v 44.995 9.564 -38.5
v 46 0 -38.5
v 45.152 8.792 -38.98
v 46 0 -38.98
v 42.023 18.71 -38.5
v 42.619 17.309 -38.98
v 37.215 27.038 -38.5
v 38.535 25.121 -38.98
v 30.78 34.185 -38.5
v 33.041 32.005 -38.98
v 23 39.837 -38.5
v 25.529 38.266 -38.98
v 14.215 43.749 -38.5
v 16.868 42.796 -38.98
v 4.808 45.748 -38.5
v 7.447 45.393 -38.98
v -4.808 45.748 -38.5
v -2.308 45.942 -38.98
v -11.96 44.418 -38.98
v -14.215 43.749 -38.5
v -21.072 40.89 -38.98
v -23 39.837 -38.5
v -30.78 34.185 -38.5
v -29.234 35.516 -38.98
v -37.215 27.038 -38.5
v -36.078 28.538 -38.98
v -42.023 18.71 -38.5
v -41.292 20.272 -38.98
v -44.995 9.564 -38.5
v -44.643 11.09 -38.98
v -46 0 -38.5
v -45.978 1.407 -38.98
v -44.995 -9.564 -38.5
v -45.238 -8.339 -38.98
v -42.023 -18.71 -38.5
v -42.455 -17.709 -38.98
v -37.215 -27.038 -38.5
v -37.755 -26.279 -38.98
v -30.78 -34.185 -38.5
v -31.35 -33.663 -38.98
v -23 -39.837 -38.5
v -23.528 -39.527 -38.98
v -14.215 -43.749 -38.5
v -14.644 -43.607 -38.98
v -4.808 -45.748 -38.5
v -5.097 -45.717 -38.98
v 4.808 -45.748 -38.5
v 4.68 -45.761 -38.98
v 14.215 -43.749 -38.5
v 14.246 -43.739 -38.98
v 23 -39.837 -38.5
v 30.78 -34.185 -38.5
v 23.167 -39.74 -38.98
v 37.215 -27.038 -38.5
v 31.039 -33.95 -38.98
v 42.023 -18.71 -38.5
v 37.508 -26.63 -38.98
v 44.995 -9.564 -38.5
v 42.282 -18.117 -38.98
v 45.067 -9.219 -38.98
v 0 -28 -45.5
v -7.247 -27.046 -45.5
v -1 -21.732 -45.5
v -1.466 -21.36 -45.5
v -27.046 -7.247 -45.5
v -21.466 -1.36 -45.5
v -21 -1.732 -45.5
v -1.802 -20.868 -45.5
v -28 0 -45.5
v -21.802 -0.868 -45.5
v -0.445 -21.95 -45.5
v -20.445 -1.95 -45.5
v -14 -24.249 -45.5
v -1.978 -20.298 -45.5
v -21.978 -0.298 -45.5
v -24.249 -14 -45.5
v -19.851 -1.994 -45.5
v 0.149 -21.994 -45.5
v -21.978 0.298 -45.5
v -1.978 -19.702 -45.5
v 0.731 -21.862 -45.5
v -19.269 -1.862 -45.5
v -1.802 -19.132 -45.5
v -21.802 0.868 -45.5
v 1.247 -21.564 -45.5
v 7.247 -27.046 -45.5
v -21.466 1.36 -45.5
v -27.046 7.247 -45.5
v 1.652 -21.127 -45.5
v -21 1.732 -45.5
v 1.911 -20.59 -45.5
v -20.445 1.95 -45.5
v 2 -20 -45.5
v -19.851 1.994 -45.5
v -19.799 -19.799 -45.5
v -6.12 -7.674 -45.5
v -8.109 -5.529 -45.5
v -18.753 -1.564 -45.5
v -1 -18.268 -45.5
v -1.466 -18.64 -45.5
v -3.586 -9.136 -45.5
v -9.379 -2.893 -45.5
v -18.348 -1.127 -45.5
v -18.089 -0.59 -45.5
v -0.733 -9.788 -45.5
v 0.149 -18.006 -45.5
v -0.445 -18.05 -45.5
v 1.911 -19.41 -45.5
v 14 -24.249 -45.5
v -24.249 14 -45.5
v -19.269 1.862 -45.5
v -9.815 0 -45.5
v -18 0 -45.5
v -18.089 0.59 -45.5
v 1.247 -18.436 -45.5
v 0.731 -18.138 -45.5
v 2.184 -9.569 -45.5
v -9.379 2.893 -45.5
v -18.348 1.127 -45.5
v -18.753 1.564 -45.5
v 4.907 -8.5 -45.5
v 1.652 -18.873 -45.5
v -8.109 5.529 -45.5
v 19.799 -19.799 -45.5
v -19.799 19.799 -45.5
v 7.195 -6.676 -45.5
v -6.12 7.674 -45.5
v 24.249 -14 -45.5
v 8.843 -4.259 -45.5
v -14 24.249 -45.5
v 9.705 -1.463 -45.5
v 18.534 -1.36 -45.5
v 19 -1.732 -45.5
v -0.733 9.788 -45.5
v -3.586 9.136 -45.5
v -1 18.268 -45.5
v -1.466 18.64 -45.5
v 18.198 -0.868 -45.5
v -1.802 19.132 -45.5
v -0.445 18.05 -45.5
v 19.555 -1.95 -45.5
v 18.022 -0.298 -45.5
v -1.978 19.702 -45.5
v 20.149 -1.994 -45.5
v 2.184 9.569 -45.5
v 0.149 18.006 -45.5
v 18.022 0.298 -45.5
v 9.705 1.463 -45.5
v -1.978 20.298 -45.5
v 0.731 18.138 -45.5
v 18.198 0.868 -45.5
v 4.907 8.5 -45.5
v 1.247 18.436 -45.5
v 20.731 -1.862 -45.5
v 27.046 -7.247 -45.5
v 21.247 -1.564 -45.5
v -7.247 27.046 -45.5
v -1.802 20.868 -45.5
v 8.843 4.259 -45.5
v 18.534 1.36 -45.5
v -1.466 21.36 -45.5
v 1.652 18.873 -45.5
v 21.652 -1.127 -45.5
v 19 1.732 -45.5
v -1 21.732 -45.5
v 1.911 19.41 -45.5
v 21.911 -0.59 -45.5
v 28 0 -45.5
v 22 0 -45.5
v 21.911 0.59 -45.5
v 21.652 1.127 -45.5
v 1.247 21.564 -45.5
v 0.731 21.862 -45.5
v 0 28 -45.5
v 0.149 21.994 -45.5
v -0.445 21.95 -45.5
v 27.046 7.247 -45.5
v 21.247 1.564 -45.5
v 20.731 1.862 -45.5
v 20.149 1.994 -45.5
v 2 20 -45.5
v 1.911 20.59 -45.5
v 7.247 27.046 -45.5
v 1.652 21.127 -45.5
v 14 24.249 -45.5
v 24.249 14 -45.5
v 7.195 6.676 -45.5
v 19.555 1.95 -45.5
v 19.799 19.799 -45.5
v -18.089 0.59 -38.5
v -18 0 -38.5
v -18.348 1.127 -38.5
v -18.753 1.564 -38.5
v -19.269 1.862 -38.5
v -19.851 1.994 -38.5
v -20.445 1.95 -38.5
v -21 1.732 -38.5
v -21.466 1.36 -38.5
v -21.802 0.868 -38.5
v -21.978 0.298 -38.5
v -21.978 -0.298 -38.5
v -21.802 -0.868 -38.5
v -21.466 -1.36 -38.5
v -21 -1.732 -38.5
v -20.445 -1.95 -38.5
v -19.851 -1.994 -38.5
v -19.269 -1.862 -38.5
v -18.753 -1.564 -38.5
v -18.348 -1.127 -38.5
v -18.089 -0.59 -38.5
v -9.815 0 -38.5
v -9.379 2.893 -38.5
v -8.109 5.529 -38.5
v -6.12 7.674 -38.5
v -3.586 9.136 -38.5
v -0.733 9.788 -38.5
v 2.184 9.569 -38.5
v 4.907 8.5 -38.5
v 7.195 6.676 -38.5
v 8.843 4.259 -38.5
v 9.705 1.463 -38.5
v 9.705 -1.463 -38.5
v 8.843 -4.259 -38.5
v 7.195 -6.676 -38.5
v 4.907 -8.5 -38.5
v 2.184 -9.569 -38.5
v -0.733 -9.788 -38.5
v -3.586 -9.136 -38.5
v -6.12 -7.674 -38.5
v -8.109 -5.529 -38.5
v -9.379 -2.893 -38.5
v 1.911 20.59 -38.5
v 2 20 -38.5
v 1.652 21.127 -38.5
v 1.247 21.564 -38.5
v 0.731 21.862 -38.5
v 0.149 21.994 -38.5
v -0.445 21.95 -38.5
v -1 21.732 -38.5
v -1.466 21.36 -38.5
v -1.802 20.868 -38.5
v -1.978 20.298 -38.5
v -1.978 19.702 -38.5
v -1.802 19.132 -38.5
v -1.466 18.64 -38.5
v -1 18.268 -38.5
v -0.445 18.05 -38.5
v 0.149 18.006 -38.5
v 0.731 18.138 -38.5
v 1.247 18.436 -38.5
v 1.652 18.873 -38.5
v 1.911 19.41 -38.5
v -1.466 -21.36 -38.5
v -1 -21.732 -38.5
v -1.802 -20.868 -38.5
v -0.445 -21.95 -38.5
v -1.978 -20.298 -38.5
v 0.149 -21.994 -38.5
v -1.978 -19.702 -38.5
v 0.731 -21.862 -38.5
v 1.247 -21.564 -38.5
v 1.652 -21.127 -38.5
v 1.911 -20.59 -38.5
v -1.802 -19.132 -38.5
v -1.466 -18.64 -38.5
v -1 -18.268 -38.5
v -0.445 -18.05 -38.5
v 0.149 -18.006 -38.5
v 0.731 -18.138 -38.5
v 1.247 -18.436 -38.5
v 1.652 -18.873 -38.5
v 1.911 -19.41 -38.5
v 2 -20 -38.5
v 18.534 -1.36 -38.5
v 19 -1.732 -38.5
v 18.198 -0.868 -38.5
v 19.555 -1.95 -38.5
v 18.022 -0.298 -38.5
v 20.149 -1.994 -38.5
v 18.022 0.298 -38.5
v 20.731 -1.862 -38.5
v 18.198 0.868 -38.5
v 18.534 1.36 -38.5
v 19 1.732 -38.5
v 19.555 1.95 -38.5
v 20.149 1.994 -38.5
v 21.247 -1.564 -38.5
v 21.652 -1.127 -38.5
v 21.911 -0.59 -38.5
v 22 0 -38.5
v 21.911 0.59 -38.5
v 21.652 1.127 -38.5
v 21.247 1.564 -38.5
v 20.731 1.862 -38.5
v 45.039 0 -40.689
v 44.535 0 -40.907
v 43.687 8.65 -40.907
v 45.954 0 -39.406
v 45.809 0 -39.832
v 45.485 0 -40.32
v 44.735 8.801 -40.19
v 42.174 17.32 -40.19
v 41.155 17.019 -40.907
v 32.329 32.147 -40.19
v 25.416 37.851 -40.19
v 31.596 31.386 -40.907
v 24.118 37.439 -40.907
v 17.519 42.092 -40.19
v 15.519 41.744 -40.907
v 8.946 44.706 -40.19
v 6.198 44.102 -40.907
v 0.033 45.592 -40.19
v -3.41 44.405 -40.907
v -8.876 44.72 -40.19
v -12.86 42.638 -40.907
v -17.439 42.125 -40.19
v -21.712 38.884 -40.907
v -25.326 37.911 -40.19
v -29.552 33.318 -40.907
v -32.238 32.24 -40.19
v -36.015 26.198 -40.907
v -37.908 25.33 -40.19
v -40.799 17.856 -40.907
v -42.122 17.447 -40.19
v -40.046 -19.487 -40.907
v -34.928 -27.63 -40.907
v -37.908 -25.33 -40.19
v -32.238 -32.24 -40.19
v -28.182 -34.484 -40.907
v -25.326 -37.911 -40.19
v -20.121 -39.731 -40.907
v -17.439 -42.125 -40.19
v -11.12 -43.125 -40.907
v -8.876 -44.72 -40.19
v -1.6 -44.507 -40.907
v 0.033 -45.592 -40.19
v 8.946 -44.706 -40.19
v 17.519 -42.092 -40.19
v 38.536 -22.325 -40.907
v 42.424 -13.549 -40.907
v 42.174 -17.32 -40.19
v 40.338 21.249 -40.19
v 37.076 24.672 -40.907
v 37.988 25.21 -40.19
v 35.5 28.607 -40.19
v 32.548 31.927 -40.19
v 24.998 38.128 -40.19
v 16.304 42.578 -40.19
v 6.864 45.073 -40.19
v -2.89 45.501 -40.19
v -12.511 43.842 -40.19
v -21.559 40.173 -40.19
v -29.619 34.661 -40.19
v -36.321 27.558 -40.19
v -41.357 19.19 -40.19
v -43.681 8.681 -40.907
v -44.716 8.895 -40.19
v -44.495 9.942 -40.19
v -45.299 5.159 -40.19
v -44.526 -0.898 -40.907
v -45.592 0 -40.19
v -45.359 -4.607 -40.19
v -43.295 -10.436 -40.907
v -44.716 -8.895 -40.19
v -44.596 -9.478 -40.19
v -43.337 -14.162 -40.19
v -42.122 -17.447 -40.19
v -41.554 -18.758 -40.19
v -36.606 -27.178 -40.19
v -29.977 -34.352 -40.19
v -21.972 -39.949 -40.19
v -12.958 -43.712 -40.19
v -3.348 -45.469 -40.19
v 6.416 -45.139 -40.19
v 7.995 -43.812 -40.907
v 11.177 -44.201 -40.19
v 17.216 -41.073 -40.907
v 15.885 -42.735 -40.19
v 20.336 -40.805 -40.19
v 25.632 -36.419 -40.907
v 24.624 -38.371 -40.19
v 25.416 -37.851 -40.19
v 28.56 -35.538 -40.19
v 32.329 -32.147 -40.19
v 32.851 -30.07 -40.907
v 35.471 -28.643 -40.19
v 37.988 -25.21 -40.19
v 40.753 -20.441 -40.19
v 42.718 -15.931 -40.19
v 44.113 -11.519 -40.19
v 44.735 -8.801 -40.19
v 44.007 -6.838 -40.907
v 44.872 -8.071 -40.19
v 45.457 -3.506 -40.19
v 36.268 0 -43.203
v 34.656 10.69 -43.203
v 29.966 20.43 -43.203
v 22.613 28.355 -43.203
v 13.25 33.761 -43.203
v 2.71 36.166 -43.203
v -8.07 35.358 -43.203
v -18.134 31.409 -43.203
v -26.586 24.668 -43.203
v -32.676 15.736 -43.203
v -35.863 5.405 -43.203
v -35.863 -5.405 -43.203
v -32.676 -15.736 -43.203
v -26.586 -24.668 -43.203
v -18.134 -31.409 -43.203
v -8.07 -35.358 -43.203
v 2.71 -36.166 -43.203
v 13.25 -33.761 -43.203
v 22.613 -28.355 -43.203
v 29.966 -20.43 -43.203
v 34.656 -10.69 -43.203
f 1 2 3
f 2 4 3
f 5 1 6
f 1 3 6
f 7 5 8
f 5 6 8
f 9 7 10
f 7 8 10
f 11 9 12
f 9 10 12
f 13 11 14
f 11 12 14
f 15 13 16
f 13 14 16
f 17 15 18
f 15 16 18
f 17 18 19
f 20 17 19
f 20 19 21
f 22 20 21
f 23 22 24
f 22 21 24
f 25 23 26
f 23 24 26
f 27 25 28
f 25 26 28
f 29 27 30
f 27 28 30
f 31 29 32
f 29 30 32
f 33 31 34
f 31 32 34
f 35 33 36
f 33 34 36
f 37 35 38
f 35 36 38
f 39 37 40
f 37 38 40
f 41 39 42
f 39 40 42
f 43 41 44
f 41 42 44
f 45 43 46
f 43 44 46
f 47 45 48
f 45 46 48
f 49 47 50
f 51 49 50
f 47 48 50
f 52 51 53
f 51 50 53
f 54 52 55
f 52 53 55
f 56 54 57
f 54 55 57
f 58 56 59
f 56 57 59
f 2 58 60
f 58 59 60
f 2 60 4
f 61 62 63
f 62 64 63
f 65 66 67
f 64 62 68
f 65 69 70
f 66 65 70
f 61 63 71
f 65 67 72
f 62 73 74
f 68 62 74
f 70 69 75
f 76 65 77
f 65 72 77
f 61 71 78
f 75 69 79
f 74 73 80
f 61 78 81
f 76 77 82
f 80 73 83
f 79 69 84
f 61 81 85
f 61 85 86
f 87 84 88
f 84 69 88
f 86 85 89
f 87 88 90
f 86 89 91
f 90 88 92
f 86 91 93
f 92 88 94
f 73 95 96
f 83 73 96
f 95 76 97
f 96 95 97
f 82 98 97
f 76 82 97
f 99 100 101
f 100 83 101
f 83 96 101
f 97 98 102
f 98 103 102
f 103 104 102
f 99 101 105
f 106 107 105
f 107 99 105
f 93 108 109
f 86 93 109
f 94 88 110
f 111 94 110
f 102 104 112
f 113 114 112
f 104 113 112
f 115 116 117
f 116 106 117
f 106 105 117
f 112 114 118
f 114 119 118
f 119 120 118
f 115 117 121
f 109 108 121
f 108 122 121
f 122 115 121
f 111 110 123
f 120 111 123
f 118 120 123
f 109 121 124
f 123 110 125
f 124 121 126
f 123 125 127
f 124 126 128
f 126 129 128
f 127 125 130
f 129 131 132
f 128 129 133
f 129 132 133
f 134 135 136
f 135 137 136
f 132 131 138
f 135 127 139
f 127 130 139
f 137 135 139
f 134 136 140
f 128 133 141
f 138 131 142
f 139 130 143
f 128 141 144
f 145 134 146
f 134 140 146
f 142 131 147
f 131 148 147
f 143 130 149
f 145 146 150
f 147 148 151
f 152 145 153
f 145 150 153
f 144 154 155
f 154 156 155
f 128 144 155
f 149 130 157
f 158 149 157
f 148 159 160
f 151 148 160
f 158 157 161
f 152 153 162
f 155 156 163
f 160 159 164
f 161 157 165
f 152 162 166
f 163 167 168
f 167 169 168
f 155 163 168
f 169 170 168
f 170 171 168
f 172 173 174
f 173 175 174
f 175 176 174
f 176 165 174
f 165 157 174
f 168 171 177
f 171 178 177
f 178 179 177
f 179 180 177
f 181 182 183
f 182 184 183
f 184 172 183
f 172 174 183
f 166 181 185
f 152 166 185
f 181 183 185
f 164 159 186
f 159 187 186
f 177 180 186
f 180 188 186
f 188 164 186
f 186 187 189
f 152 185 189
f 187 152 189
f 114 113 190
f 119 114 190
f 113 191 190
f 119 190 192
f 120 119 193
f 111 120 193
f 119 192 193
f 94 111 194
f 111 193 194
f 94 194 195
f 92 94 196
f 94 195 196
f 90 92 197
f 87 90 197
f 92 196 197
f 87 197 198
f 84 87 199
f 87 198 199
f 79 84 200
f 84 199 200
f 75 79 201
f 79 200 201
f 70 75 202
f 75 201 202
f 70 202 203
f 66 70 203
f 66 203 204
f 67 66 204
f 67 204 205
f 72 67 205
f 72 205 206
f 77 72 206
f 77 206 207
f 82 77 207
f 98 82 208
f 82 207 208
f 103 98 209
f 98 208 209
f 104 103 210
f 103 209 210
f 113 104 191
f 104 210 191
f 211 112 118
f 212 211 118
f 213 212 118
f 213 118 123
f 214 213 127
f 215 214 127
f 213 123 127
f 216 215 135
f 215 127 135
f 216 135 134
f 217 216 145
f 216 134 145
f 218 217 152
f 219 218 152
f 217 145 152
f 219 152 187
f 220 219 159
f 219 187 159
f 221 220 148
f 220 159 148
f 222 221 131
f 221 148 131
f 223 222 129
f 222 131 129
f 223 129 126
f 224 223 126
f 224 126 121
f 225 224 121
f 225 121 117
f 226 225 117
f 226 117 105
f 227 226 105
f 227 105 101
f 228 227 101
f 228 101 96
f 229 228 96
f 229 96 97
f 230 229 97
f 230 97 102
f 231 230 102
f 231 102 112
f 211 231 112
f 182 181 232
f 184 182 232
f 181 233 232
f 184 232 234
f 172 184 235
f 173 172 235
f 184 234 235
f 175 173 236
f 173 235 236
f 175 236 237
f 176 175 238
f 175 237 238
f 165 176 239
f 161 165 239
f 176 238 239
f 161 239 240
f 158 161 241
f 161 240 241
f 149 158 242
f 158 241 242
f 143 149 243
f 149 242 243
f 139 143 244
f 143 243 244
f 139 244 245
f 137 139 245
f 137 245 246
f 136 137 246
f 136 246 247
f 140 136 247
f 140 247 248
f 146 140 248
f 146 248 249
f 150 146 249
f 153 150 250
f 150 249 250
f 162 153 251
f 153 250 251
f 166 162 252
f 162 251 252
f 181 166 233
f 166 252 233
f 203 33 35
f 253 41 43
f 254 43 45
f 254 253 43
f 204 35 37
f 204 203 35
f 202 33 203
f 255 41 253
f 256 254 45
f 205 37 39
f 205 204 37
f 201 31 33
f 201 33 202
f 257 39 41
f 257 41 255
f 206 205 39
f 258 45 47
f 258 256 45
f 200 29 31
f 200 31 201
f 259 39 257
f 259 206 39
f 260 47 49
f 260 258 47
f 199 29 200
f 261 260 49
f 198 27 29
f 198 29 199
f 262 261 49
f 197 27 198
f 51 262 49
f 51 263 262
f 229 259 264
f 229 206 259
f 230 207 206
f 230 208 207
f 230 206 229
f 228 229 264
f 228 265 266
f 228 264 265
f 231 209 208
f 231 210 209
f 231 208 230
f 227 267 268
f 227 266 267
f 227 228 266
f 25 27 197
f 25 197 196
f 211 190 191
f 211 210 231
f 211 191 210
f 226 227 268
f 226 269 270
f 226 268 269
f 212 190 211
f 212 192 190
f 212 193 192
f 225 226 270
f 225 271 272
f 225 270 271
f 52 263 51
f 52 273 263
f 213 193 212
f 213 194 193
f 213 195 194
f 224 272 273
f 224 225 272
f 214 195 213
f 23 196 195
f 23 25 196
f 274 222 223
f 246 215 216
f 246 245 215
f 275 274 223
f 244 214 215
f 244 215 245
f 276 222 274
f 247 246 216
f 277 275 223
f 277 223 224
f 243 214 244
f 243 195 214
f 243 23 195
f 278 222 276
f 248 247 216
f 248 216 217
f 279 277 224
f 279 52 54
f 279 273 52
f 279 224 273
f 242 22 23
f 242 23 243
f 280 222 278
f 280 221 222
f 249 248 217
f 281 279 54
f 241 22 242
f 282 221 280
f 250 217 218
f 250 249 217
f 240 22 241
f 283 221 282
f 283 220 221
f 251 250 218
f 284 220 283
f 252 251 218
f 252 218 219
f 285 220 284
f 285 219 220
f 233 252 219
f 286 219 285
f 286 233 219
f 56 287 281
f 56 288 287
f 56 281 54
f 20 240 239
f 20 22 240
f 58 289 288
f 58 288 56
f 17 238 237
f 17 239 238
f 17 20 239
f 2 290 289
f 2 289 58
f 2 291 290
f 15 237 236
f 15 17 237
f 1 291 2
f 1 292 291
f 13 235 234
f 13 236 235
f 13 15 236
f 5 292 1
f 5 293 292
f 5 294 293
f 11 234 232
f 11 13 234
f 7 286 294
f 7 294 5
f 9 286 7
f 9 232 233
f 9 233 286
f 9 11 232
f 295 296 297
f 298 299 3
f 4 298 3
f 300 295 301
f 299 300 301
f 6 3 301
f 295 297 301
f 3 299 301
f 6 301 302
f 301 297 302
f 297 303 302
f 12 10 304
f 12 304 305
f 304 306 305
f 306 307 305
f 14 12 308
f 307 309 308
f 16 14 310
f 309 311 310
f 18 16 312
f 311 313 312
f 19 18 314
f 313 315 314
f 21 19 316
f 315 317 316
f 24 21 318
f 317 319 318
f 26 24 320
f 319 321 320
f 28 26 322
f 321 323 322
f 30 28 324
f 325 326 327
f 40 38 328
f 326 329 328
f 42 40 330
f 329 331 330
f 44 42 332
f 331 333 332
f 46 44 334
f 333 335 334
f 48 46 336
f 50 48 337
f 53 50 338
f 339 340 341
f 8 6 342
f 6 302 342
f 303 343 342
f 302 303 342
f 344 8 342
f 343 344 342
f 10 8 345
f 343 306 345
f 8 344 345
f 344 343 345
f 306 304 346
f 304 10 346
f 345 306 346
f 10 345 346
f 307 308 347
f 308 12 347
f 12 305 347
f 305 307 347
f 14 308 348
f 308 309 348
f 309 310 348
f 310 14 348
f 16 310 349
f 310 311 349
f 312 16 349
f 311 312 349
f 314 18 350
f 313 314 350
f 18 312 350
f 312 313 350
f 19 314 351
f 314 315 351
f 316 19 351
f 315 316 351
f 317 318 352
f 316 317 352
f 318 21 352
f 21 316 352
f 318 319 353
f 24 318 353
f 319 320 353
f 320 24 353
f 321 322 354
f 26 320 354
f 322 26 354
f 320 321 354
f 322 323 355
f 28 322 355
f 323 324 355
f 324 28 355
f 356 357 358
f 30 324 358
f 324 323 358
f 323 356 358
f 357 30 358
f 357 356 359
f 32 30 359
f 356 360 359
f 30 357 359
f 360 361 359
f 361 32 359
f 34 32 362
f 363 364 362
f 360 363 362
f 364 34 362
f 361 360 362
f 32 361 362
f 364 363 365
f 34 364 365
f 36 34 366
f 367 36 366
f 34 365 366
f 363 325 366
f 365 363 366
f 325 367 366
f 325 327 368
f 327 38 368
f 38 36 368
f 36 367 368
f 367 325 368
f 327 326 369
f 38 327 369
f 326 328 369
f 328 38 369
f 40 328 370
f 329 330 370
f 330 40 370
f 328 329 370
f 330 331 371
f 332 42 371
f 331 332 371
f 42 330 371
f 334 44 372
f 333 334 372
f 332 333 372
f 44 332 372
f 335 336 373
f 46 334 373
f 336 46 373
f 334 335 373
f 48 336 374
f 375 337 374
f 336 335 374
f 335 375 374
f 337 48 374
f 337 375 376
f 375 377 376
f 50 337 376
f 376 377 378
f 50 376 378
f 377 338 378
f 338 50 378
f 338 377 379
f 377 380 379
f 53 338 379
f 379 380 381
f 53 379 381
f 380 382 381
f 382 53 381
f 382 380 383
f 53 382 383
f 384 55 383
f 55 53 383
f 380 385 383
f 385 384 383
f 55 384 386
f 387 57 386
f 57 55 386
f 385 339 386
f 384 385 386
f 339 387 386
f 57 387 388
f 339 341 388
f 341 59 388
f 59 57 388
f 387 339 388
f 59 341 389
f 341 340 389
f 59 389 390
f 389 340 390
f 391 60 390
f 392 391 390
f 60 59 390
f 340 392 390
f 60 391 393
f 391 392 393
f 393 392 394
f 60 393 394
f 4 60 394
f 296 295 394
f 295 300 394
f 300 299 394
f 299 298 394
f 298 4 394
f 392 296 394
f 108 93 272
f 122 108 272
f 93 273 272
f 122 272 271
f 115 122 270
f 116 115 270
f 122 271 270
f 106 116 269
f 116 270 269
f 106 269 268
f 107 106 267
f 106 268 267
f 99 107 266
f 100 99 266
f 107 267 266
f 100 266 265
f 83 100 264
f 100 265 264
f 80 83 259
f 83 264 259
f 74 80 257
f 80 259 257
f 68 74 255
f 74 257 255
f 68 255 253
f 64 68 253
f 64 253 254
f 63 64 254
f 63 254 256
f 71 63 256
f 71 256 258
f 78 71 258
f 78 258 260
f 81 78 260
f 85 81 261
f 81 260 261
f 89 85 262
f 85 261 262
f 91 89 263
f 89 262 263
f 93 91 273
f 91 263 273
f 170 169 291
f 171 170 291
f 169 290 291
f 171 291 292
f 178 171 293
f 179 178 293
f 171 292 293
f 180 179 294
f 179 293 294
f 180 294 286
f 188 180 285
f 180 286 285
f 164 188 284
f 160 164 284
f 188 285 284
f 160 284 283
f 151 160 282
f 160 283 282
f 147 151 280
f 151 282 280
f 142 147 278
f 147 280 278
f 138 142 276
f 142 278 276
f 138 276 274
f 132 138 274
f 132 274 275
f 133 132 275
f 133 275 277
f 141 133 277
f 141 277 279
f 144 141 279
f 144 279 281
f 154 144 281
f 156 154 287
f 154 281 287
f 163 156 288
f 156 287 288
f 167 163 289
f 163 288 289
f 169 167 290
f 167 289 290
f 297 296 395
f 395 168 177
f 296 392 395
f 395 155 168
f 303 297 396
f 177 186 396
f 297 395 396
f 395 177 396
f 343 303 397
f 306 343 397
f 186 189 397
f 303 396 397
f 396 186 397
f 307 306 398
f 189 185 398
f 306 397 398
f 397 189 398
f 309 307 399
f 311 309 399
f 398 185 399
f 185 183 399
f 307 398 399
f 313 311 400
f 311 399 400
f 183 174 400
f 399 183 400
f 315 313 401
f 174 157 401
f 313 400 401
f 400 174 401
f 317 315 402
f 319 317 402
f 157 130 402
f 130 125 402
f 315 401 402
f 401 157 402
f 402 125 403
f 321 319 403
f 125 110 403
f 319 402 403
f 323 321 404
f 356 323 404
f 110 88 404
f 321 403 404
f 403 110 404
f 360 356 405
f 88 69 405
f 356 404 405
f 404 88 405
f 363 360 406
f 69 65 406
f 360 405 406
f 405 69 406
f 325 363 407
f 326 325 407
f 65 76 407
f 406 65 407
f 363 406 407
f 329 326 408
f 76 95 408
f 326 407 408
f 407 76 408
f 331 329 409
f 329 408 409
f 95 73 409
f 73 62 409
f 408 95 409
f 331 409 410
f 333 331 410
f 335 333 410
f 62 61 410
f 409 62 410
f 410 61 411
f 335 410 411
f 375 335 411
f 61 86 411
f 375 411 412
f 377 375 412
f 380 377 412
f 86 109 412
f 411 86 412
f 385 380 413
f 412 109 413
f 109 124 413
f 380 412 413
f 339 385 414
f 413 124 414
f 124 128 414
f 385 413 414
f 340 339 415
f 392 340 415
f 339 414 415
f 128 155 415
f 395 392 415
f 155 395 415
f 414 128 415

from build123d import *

# Parameters (mm, degrees)
BOSS_EXTRUDE1_DEPTH          = 4
SKETCH3_R                    = 1.5
BOSS_EXTRUDE2_DEPTH          = 6
F_3_0_3_DIAMETER_HOLE1_D     = 3
F_3_0_3_DIAMETER_HOLE1_DEPTH = 10
F_4_0_4_DIAMETER_HOLE1_D     = 4
F_4_0_4_DIAMETER_HOLE1_DEPTH = 10
FILLET1_R                    = 2
FILLET2_R                    = 14.5
CUT_EXTRUDE1_DEPTH           = 73.945185819
CUT_EXTRUDE1_DEPTH_BACK      = 22
SKETCH8_R                    = 46
SKETCH9_R                    = 9.814954576
CUT_EXTRUDE2_DEPTH           = 21


with BuildPart() as part:
    # Sketch1 → Revolve1 (revolve)
    with BuildSketch(Plane(origin=(0, 0, 0), x_dir=(1, 0, 0), z_dir=(0, 1, 0))):
        Polygon((28, 45.5), (0, 45.5), (0, 16.5), (36, 16.5), (46, 26.5), (46, 40.5), align=None)
    revolve(axis=Axis((0, 0, -45.5), (0, 0, 1)))

    # Sketch2 → Boss-Extrude1 (add)
    with BuildSketch(Plane(origin=(0, 0, -45.5), x_dir=(-1, 0, 0), z_dir=(0, 0, -1))):
        Polygon((-9.814954576, 0), (-4.907477288, 8.5), (4.907477288, 8.5), (9.814954576, 0), (4.907477288, -8.5), (-4.907477288, -8.5), align=None)
    extrude(amount=BOSS_EXTRUDE1_DEPTH)

    # Sketch3 → Boss-Extrude2 (add)
    with BuildSketch(Plane.XY.offset(-16.5)):
        Circle(SKETCH3_R)
    extrude(amount=BOSS_EXTRUDE2_DEPTH)

    # Ø3.0 (3) Diameter Hole1
    with Locations(Plane.XY.offset(-16.5)):
        with Locations((-15.5, 0), (0, 15.5), (0, -15.5), (15.5, 0)):
            Hole(F_3_0_3_DIAMETER_HOLE1_D / 2, depth=F_3_0_3_DIAMETER_HOLE1_DEPTH)

    # Ø4.0 (4) Diameter Hole1
    with Locations(Plane(origin=(0, 0, -45.5), x_dir=(-1, 0, 0), z_dir=(0, 0, -1))):
        with Locations((0, -20), (-20, 0), (20, 0), (0, 20)):
            Hole(F_4_0_4_DIAMETER_HOLE1_D / 2, depth=F_4_0_4_DIAMETER_HOLE1_DEPTH)

    # Fillet1
    fillet1_edges = [part.edges().sort_by_distance(p)[0] for p in [
        (-46, 0, -40.5),
        (-46, 0, -26.5),
    ]]
    fillet(fillet1_edges, radius=FILLET1_R)

    # Fillet2
    fillet2_edges = [part.edges().sort_by_distance(p)[0] for p in [
        (-36, 0, -16.5),
    ]]
    fillet(fillet2_edges, radius=FILLET2_R)

    # Sketch8 → Cut-Extrude1 (cut, two sides: drawn at the far end of the back side and taken through both)
    with BuildSketch(Plane.XY.offset(-16.5).offset(-CUT_EXTRUDE1_DEPTH_BACK)):
        Circle(SKETCH8_R)
    extrude(amount=CUT_EXTRUDE1_DEPTH + CUT_EXTRUDE1_DEPTH_BACK, mode=Mode.SUBTRACT)

    # Sketch9 → Cut-Extrude2 (cut)
    with BuildSketch(Plane(origin=(0, 0, -49.5), x_dir=(-1, 0, 0), z_dir=(0, 0, -1))):
        Circle(SKETCH9_R)
    extrude(amount=-CUT_EXTRUDE2_DEPTH, mode=Mode.SUBTRACT)


solid = part.part
